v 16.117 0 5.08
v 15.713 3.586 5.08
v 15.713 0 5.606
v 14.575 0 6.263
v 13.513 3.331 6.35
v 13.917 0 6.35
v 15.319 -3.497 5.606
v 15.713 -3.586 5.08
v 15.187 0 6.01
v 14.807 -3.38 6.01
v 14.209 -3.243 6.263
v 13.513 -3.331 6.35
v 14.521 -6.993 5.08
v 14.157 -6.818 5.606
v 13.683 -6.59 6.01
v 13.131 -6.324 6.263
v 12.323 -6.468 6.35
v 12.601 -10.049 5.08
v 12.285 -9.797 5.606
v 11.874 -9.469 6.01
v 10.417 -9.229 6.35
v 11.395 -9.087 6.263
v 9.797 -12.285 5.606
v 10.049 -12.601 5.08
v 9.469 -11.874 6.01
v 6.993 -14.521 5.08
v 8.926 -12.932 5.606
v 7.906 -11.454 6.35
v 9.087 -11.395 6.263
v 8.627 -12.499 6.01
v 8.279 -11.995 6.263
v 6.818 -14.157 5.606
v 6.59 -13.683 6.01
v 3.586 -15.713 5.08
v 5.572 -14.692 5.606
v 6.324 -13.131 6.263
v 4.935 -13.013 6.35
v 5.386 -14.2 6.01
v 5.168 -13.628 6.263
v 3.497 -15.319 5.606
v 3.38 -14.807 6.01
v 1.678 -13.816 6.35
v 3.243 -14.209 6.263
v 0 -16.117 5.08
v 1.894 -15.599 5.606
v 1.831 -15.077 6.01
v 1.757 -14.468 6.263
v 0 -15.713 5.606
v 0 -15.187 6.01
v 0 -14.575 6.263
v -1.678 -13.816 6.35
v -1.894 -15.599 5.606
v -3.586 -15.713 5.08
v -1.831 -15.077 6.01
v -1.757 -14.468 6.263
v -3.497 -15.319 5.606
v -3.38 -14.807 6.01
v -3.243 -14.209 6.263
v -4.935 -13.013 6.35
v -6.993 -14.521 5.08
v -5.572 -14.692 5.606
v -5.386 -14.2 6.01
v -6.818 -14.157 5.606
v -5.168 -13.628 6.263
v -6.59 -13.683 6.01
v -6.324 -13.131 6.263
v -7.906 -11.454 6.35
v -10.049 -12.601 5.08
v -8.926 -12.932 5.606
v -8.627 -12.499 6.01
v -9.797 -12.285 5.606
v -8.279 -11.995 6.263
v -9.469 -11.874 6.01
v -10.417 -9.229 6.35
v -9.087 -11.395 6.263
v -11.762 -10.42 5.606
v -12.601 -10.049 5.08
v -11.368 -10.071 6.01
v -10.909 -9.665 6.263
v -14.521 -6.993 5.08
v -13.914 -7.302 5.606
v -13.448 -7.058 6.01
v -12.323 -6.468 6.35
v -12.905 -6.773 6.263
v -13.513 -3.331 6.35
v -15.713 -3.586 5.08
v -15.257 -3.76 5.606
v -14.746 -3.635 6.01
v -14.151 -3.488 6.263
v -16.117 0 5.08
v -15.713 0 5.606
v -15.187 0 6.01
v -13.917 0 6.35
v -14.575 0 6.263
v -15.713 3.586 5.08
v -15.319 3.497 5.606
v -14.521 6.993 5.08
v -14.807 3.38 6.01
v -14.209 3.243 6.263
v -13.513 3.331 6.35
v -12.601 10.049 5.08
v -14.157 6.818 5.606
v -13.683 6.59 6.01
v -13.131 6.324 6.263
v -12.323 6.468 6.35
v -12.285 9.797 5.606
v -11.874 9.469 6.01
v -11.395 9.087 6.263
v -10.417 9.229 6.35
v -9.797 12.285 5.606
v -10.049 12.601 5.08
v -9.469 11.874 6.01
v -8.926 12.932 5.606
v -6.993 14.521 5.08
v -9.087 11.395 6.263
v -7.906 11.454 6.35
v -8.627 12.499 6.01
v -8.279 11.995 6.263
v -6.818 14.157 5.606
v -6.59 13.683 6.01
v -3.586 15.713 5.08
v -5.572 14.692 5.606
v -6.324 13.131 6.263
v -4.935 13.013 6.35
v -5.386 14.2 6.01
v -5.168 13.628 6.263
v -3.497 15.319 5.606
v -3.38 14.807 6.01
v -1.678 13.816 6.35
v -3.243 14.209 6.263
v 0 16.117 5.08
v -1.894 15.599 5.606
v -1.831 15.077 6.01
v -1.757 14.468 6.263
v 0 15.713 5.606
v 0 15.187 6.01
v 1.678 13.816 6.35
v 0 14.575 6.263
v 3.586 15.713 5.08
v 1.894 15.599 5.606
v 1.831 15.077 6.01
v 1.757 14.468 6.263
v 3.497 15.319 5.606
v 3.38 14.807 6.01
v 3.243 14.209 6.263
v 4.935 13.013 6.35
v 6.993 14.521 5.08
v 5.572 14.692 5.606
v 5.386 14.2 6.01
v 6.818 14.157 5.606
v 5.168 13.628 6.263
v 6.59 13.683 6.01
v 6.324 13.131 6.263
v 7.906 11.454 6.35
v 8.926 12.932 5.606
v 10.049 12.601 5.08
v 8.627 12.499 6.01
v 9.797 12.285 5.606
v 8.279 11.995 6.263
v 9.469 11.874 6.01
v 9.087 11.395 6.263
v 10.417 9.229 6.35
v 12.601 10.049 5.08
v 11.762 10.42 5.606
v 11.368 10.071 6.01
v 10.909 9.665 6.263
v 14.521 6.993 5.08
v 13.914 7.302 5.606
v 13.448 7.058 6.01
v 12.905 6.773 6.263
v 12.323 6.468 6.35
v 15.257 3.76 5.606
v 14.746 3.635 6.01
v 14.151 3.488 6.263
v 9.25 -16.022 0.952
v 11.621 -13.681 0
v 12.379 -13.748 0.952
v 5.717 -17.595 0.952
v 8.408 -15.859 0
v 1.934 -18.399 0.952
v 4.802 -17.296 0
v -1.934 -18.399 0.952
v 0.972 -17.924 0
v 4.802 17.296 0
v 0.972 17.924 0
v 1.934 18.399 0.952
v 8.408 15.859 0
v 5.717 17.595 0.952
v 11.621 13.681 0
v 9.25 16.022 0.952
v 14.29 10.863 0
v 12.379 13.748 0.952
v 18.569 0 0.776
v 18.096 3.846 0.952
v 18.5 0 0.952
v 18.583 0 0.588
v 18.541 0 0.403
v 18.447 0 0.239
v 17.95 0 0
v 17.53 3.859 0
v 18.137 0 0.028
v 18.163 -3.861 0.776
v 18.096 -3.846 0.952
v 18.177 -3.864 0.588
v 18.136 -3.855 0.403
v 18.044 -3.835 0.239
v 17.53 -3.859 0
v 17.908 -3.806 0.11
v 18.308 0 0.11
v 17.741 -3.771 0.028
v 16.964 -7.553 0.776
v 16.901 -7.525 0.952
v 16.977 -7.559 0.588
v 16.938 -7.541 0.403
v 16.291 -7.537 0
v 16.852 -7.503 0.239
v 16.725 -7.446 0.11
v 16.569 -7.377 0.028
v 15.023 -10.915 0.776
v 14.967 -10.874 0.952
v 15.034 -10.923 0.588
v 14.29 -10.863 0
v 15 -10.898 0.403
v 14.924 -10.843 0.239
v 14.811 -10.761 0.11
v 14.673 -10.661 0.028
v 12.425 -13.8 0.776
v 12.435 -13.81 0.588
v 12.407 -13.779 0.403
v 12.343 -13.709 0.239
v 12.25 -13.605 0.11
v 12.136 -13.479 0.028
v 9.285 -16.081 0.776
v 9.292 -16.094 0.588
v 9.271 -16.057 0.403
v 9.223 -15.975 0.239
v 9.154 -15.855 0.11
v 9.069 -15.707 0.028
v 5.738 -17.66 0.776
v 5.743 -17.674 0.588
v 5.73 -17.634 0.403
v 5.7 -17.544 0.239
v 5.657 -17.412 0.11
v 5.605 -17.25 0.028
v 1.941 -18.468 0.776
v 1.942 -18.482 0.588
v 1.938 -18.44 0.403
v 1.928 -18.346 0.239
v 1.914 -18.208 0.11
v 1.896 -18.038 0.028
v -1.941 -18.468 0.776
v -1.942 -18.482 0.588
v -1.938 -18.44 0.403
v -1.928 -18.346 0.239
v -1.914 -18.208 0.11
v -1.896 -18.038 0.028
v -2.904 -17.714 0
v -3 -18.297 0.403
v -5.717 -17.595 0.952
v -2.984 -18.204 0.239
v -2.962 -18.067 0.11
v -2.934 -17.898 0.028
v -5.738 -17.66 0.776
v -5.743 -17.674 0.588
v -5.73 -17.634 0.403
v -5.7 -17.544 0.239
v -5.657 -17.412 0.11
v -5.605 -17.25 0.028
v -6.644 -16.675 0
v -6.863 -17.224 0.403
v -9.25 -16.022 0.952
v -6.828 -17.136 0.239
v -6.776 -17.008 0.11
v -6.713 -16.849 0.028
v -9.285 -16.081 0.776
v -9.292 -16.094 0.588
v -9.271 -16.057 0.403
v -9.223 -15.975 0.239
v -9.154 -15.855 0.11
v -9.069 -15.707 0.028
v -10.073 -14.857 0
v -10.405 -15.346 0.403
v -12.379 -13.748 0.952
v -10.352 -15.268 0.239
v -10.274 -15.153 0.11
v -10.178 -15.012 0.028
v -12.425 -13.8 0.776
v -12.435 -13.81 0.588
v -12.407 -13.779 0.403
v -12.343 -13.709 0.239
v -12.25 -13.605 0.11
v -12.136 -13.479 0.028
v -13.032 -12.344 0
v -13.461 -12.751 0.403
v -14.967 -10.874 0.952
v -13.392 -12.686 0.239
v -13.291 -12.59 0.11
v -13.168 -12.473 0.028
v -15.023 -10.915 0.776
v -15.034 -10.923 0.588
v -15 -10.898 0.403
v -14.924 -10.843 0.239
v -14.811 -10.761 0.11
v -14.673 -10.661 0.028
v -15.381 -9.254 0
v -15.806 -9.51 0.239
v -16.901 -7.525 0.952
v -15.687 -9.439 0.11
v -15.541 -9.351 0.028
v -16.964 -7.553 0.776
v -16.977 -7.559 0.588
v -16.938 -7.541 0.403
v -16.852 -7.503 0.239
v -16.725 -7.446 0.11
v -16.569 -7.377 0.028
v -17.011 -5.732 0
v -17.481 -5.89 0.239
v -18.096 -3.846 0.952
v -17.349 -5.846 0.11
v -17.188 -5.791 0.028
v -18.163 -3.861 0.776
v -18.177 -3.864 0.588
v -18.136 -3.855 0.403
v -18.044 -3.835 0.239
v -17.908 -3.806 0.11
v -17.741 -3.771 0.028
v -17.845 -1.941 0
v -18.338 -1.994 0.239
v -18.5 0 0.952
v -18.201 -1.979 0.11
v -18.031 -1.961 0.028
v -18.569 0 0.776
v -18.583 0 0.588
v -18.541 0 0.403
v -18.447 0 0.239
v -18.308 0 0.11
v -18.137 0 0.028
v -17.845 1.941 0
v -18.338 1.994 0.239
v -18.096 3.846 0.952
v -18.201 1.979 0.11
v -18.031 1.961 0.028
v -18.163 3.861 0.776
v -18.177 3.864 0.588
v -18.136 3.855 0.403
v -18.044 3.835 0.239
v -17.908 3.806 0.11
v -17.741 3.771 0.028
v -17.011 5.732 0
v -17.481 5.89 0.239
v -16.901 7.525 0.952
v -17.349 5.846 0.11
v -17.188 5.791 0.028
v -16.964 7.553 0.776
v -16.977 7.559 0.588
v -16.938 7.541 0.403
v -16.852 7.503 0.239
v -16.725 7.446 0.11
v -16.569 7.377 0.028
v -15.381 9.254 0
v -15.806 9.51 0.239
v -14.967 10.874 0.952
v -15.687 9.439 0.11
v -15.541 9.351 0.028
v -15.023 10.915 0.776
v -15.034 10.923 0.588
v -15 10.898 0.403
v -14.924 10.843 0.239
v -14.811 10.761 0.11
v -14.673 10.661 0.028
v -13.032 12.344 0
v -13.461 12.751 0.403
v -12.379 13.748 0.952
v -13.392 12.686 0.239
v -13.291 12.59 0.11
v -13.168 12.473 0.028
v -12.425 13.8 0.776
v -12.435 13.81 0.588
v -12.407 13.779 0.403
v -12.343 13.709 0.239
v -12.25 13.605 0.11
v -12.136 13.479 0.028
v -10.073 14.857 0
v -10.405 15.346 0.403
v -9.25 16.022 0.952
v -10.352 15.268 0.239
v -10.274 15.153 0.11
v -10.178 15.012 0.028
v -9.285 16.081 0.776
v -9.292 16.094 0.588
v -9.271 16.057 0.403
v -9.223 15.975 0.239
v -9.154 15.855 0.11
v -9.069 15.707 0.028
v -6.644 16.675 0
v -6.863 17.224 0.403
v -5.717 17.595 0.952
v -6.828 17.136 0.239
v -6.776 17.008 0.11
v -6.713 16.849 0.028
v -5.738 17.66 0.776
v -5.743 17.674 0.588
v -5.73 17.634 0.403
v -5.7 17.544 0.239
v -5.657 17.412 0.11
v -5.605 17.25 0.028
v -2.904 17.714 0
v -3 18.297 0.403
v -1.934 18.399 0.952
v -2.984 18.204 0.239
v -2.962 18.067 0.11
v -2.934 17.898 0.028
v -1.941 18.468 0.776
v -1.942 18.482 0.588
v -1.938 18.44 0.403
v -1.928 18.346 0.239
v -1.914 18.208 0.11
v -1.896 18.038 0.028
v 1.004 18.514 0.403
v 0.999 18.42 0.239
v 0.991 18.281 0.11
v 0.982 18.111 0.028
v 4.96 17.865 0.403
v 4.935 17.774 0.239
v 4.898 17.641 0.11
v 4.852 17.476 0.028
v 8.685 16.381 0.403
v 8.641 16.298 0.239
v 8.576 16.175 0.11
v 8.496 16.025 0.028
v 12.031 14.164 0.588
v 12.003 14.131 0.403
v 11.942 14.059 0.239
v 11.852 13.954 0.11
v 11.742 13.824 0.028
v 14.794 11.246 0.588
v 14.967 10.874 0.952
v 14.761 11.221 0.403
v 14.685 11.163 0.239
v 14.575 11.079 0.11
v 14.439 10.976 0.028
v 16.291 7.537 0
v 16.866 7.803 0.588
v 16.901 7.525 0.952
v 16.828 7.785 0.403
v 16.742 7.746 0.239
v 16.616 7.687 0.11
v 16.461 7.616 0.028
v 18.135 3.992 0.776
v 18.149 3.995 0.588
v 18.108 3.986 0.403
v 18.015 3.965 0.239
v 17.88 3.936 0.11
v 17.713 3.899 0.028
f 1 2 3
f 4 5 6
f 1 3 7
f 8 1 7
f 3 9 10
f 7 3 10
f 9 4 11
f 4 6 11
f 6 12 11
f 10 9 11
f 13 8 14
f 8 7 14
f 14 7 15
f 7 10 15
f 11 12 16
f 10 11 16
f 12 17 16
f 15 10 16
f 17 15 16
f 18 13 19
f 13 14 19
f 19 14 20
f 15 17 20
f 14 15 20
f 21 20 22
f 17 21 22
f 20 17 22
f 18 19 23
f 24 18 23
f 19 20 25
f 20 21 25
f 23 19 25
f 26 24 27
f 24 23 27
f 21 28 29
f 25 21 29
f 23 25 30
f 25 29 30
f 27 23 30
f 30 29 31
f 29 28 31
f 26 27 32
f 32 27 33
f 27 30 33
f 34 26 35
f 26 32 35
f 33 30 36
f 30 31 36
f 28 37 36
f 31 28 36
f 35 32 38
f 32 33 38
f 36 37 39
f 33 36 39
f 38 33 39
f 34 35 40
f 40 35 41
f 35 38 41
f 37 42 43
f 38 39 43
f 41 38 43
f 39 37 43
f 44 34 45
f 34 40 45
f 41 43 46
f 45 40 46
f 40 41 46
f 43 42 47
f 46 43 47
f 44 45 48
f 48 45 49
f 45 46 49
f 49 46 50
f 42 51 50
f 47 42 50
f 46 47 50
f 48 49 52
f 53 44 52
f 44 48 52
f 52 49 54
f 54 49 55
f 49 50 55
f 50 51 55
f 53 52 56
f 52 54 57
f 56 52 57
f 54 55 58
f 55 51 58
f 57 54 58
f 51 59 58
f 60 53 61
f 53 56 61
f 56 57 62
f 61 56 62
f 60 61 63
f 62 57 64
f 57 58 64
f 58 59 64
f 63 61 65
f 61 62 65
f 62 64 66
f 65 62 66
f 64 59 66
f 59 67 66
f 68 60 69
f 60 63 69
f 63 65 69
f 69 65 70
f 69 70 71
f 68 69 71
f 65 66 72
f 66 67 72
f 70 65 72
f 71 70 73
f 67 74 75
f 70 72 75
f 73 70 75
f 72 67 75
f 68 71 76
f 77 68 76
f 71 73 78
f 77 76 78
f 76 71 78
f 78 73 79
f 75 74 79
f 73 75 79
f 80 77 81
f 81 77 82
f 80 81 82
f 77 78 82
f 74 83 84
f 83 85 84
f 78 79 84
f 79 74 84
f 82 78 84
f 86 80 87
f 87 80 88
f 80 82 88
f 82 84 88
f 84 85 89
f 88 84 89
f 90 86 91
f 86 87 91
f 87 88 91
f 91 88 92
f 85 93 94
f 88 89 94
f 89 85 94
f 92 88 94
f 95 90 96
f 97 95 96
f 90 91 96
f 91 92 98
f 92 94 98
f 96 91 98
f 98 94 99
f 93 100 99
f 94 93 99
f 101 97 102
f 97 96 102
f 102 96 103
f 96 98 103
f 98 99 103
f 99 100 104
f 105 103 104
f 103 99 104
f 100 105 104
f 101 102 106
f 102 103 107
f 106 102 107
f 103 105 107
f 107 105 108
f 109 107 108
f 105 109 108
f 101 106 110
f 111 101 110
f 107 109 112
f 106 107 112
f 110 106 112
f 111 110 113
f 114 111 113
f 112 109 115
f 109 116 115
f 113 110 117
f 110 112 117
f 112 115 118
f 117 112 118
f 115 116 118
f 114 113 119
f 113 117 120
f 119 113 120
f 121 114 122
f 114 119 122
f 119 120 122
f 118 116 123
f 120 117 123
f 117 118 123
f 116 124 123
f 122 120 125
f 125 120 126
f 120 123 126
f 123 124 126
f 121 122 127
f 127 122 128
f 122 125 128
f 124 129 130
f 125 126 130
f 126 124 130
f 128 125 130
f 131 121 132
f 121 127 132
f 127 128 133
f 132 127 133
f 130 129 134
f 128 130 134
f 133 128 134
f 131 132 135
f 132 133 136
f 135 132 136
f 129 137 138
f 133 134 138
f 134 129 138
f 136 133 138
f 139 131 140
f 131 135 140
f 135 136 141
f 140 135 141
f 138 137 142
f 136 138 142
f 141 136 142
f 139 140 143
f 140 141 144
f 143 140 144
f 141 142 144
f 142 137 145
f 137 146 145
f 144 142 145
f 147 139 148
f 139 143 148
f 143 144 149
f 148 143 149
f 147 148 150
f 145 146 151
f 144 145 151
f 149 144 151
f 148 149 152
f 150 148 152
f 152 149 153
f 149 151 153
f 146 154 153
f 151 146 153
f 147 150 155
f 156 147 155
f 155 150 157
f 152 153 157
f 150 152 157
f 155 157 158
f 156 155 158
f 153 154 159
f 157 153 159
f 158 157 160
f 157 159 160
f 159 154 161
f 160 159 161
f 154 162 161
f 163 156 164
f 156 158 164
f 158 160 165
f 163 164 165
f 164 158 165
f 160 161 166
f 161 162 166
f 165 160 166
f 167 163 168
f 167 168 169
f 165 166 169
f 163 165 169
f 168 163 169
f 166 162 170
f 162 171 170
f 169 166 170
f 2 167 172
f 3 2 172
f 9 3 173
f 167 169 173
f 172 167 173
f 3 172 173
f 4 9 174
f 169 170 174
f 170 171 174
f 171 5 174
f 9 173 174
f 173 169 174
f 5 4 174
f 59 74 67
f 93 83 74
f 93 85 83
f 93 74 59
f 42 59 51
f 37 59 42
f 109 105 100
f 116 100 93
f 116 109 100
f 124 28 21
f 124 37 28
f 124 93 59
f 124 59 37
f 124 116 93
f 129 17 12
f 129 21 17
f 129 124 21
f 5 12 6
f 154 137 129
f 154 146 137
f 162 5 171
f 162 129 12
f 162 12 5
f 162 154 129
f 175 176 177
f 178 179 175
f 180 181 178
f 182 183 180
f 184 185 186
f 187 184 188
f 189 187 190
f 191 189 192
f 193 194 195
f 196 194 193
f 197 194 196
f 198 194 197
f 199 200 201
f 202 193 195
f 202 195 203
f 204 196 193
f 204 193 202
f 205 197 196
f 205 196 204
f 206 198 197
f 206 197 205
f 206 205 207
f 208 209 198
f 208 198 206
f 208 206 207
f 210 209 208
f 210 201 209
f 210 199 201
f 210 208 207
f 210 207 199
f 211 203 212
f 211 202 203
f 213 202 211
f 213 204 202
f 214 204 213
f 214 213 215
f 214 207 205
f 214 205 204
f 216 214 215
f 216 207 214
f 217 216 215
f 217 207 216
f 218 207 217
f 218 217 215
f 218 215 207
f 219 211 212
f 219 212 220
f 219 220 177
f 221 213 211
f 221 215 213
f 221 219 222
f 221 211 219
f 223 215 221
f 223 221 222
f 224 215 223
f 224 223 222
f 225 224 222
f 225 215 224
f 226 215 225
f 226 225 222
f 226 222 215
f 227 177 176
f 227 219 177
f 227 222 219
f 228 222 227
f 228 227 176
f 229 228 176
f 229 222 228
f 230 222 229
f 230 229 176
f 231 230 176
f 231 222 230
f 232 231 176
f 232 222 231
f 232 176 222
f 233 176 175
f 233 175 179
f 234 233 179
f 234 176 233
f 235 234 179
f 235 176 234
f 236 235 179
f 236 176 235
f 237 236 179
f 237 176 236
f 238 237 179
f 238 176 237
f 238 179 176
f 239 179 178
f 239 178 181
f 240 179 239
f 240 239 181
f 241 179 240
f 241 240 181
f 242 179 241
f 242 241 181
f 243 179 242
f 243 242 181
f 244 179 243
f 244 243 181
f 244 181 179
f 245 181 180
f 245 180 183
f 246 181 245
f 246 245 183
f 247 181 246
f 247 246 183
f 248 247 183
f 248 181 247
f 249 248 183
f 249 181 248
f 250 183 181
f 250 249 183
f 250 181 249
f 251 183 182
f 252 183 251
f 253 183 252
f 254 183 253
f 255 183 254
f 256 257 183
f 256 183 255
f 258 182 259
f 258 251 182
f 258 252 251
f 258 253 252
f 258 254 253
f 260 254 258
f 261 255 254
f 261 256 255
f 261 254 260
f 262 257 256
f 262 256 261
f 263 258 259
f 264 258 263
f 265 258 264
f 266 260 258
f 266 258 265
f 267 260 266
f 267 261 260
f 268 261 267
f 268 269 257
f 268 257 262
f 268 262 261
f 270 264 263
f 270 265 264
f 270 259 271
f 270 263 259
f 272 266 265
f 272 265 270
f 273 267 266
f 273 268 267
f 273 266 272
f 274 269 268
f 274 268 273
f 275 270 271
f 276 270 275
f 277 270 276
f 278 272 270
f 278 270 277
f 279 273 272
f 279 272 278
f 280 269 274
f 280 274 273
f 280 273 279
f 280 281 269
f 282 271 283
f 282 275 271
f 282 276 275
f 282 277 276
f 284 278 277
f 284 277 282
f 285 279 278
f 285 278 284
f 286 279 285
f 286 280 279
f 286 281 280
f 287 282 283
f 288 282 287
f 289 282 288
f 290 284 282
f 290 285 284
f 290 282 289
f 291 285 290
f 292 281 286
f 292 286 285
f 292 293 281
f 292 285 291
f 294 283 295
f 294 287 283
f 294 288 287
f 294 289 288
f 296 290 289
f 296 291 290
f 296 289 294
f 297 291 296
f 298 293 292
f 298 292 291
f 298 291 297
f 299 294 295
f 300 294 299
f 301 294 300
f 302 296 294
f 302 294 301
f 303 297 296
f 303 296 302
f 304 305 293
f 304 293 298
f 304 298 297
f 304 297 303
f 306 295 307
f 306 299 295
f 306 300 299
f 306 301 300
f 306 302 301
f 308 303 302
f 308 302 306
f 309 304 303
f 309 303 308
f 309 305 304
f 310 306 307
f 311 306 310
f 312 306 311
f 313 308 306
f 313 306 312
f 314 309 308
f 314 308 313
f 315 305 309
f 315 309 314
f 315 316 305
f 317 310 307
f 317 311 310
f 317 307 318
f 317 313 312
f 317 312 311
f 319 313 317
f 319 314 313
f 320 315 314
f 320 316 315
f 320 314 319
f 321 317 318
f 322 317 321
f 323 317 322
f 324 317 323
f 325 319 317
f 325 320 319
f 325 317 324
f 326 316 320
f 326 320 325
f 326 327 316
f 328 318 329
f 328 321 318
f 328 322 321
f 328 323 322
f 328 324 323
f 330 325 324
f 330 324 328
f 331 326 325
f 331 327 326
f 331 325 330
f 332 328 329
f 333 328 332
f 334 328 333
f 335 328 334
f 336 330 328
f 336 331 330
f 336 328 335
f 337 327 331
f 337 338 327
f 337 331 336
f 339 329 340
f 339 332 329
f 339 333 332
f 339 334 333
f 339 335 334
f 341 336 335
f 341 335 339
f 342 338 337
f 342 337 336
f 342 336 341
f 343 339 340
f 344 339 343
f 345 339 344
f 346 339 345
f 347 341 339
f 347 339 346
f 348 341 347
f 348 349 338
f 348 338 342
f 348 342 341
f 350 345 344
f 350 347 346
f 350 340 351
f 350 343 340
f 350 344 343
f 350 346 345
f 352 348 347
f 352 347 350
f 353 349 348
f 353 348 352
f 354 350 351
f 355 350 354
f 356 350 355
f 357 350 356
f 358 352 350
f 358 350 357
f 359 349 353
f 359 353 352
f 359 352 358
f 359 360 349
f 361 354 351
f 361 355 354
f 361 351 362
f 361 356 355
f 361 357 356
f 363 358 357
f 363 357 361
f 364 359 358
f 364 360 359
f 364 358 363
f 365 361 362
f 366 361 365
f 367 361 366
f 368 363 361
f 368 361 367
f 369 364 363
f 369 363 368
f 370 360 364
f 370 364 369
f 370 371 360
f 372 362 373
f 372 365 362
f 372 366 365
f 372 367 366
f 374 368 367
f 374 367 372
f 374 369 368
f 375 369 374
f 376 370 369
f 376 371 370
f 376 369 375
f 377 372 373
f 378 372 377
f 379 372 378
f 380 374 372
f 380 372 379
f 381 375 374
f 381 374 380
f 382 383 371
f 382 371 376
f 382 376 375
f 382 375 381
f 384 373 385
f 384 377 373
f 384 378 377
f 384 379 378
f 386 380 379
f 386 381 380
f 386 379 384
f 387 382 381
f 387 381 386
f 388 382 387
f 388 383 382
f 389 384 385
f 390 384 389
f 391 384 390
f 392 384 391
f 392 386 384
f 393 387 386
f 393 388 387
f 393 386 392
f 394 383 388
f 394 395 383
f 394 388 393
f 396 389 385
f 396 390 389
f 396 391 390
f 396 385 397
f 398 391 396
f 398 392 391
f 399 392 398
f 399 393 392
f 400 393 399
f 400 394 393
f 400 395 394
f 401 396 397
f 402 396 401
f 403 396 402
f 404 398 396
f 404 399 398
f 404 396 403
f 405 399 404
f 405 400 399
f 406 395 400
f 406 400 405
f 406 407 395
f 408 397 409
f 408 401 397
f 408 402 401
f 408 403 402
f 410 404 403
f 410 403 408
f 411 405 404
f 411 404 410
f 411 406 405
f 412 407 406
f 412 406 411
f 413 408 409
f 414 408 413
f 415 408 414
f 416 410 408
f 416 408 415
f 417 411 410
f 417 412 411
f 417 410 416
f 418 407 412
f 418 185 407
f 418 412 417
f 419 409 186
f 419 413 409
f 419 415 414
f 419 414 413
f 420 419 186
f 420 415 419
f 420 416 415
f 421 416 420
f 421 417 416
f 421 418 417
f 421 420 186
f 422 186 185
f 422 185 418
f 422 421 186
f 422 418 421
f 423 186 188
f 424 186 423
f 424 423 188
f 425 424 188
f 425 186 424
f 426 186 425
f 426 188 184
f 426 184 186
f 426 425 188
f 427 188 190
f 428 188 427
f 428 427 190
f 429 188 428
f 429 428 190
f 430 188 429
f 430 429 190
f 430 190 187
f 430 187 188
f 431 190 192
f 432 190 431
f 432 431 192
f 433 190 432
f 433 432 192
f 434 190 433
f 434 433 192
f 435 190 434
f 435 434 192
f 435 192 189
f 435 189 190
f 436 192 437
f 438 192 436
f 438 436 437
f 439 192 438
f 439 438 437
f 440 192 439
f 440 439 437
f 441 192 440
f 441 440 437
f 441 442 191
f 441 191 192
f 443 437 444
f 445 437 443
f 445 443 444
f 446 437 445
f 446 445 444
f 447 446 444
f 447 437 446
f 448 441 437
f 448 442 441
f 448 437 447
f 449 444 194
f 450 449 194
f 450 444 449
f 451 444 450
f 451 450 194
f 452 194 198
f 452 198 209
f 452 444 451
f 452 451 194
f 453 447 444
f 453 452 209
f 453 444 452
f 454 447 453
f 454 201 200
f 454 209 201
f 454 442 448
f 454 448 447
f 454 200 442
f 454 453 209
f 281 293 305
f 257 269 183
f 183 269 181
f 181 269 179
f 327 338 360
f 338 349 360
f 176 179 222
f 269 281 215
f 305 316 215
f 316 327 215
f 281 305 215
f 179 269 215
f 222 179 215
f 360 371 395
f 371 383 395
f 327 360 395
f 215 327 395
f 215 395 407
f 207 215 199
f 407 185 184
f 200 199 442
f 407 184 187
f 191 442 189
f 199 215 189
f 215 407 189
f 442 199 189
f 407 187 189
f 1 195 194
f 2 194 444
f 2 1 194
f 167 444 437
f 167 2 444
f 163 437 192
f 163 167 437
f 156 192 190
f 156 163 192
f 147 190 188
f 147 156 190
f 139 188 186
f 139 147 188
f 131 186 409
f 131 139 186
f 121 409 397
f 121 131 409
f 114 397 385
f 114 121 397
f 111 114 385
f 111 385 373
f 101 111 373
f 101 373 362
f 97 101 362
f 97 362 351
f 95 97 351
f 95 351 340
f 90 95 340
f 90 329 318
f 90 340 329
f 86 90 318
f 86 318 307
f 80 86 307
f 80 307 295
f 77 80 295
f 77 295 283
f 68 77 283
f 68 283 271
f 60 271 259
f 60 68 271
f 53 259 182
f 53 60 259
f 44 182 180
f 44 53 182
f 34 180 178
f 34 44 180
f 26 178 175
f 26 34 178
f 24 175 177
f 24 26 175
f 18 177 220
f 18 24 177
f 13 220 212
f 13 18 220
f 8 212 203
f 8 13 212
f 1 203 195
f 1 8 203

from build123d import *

# Parameters (mm, degrees)
F0_R     = 19.05
F1_DEPTH = 6.35
F1_TAPER = 30
F2_R     = 2.54
F3_R     = 0.635


with BuildPart() as f1:
    # F0 (on Top) → F1 (new body)
    with BuildSketch(Plane.XY):
        Circle(F0_R)
    extrude(amount=F1_DEPTH, taper=F1_TAPER)

    # F2
    f2_edges = [f1.edges().sort_by_distance(p)[0] for p in [
        (-15.383826, 0, 6.35),
    ]]
    fillet(f2_edges, radius=F2_R)

    # F3
    f3_edges = [f1.edges().sort_by_distance(p)[0] for p in [
        (-19.05, 0, 0),
    ]]
    fillet(f3_edges, radius=F3_R)


solid = f1.part
